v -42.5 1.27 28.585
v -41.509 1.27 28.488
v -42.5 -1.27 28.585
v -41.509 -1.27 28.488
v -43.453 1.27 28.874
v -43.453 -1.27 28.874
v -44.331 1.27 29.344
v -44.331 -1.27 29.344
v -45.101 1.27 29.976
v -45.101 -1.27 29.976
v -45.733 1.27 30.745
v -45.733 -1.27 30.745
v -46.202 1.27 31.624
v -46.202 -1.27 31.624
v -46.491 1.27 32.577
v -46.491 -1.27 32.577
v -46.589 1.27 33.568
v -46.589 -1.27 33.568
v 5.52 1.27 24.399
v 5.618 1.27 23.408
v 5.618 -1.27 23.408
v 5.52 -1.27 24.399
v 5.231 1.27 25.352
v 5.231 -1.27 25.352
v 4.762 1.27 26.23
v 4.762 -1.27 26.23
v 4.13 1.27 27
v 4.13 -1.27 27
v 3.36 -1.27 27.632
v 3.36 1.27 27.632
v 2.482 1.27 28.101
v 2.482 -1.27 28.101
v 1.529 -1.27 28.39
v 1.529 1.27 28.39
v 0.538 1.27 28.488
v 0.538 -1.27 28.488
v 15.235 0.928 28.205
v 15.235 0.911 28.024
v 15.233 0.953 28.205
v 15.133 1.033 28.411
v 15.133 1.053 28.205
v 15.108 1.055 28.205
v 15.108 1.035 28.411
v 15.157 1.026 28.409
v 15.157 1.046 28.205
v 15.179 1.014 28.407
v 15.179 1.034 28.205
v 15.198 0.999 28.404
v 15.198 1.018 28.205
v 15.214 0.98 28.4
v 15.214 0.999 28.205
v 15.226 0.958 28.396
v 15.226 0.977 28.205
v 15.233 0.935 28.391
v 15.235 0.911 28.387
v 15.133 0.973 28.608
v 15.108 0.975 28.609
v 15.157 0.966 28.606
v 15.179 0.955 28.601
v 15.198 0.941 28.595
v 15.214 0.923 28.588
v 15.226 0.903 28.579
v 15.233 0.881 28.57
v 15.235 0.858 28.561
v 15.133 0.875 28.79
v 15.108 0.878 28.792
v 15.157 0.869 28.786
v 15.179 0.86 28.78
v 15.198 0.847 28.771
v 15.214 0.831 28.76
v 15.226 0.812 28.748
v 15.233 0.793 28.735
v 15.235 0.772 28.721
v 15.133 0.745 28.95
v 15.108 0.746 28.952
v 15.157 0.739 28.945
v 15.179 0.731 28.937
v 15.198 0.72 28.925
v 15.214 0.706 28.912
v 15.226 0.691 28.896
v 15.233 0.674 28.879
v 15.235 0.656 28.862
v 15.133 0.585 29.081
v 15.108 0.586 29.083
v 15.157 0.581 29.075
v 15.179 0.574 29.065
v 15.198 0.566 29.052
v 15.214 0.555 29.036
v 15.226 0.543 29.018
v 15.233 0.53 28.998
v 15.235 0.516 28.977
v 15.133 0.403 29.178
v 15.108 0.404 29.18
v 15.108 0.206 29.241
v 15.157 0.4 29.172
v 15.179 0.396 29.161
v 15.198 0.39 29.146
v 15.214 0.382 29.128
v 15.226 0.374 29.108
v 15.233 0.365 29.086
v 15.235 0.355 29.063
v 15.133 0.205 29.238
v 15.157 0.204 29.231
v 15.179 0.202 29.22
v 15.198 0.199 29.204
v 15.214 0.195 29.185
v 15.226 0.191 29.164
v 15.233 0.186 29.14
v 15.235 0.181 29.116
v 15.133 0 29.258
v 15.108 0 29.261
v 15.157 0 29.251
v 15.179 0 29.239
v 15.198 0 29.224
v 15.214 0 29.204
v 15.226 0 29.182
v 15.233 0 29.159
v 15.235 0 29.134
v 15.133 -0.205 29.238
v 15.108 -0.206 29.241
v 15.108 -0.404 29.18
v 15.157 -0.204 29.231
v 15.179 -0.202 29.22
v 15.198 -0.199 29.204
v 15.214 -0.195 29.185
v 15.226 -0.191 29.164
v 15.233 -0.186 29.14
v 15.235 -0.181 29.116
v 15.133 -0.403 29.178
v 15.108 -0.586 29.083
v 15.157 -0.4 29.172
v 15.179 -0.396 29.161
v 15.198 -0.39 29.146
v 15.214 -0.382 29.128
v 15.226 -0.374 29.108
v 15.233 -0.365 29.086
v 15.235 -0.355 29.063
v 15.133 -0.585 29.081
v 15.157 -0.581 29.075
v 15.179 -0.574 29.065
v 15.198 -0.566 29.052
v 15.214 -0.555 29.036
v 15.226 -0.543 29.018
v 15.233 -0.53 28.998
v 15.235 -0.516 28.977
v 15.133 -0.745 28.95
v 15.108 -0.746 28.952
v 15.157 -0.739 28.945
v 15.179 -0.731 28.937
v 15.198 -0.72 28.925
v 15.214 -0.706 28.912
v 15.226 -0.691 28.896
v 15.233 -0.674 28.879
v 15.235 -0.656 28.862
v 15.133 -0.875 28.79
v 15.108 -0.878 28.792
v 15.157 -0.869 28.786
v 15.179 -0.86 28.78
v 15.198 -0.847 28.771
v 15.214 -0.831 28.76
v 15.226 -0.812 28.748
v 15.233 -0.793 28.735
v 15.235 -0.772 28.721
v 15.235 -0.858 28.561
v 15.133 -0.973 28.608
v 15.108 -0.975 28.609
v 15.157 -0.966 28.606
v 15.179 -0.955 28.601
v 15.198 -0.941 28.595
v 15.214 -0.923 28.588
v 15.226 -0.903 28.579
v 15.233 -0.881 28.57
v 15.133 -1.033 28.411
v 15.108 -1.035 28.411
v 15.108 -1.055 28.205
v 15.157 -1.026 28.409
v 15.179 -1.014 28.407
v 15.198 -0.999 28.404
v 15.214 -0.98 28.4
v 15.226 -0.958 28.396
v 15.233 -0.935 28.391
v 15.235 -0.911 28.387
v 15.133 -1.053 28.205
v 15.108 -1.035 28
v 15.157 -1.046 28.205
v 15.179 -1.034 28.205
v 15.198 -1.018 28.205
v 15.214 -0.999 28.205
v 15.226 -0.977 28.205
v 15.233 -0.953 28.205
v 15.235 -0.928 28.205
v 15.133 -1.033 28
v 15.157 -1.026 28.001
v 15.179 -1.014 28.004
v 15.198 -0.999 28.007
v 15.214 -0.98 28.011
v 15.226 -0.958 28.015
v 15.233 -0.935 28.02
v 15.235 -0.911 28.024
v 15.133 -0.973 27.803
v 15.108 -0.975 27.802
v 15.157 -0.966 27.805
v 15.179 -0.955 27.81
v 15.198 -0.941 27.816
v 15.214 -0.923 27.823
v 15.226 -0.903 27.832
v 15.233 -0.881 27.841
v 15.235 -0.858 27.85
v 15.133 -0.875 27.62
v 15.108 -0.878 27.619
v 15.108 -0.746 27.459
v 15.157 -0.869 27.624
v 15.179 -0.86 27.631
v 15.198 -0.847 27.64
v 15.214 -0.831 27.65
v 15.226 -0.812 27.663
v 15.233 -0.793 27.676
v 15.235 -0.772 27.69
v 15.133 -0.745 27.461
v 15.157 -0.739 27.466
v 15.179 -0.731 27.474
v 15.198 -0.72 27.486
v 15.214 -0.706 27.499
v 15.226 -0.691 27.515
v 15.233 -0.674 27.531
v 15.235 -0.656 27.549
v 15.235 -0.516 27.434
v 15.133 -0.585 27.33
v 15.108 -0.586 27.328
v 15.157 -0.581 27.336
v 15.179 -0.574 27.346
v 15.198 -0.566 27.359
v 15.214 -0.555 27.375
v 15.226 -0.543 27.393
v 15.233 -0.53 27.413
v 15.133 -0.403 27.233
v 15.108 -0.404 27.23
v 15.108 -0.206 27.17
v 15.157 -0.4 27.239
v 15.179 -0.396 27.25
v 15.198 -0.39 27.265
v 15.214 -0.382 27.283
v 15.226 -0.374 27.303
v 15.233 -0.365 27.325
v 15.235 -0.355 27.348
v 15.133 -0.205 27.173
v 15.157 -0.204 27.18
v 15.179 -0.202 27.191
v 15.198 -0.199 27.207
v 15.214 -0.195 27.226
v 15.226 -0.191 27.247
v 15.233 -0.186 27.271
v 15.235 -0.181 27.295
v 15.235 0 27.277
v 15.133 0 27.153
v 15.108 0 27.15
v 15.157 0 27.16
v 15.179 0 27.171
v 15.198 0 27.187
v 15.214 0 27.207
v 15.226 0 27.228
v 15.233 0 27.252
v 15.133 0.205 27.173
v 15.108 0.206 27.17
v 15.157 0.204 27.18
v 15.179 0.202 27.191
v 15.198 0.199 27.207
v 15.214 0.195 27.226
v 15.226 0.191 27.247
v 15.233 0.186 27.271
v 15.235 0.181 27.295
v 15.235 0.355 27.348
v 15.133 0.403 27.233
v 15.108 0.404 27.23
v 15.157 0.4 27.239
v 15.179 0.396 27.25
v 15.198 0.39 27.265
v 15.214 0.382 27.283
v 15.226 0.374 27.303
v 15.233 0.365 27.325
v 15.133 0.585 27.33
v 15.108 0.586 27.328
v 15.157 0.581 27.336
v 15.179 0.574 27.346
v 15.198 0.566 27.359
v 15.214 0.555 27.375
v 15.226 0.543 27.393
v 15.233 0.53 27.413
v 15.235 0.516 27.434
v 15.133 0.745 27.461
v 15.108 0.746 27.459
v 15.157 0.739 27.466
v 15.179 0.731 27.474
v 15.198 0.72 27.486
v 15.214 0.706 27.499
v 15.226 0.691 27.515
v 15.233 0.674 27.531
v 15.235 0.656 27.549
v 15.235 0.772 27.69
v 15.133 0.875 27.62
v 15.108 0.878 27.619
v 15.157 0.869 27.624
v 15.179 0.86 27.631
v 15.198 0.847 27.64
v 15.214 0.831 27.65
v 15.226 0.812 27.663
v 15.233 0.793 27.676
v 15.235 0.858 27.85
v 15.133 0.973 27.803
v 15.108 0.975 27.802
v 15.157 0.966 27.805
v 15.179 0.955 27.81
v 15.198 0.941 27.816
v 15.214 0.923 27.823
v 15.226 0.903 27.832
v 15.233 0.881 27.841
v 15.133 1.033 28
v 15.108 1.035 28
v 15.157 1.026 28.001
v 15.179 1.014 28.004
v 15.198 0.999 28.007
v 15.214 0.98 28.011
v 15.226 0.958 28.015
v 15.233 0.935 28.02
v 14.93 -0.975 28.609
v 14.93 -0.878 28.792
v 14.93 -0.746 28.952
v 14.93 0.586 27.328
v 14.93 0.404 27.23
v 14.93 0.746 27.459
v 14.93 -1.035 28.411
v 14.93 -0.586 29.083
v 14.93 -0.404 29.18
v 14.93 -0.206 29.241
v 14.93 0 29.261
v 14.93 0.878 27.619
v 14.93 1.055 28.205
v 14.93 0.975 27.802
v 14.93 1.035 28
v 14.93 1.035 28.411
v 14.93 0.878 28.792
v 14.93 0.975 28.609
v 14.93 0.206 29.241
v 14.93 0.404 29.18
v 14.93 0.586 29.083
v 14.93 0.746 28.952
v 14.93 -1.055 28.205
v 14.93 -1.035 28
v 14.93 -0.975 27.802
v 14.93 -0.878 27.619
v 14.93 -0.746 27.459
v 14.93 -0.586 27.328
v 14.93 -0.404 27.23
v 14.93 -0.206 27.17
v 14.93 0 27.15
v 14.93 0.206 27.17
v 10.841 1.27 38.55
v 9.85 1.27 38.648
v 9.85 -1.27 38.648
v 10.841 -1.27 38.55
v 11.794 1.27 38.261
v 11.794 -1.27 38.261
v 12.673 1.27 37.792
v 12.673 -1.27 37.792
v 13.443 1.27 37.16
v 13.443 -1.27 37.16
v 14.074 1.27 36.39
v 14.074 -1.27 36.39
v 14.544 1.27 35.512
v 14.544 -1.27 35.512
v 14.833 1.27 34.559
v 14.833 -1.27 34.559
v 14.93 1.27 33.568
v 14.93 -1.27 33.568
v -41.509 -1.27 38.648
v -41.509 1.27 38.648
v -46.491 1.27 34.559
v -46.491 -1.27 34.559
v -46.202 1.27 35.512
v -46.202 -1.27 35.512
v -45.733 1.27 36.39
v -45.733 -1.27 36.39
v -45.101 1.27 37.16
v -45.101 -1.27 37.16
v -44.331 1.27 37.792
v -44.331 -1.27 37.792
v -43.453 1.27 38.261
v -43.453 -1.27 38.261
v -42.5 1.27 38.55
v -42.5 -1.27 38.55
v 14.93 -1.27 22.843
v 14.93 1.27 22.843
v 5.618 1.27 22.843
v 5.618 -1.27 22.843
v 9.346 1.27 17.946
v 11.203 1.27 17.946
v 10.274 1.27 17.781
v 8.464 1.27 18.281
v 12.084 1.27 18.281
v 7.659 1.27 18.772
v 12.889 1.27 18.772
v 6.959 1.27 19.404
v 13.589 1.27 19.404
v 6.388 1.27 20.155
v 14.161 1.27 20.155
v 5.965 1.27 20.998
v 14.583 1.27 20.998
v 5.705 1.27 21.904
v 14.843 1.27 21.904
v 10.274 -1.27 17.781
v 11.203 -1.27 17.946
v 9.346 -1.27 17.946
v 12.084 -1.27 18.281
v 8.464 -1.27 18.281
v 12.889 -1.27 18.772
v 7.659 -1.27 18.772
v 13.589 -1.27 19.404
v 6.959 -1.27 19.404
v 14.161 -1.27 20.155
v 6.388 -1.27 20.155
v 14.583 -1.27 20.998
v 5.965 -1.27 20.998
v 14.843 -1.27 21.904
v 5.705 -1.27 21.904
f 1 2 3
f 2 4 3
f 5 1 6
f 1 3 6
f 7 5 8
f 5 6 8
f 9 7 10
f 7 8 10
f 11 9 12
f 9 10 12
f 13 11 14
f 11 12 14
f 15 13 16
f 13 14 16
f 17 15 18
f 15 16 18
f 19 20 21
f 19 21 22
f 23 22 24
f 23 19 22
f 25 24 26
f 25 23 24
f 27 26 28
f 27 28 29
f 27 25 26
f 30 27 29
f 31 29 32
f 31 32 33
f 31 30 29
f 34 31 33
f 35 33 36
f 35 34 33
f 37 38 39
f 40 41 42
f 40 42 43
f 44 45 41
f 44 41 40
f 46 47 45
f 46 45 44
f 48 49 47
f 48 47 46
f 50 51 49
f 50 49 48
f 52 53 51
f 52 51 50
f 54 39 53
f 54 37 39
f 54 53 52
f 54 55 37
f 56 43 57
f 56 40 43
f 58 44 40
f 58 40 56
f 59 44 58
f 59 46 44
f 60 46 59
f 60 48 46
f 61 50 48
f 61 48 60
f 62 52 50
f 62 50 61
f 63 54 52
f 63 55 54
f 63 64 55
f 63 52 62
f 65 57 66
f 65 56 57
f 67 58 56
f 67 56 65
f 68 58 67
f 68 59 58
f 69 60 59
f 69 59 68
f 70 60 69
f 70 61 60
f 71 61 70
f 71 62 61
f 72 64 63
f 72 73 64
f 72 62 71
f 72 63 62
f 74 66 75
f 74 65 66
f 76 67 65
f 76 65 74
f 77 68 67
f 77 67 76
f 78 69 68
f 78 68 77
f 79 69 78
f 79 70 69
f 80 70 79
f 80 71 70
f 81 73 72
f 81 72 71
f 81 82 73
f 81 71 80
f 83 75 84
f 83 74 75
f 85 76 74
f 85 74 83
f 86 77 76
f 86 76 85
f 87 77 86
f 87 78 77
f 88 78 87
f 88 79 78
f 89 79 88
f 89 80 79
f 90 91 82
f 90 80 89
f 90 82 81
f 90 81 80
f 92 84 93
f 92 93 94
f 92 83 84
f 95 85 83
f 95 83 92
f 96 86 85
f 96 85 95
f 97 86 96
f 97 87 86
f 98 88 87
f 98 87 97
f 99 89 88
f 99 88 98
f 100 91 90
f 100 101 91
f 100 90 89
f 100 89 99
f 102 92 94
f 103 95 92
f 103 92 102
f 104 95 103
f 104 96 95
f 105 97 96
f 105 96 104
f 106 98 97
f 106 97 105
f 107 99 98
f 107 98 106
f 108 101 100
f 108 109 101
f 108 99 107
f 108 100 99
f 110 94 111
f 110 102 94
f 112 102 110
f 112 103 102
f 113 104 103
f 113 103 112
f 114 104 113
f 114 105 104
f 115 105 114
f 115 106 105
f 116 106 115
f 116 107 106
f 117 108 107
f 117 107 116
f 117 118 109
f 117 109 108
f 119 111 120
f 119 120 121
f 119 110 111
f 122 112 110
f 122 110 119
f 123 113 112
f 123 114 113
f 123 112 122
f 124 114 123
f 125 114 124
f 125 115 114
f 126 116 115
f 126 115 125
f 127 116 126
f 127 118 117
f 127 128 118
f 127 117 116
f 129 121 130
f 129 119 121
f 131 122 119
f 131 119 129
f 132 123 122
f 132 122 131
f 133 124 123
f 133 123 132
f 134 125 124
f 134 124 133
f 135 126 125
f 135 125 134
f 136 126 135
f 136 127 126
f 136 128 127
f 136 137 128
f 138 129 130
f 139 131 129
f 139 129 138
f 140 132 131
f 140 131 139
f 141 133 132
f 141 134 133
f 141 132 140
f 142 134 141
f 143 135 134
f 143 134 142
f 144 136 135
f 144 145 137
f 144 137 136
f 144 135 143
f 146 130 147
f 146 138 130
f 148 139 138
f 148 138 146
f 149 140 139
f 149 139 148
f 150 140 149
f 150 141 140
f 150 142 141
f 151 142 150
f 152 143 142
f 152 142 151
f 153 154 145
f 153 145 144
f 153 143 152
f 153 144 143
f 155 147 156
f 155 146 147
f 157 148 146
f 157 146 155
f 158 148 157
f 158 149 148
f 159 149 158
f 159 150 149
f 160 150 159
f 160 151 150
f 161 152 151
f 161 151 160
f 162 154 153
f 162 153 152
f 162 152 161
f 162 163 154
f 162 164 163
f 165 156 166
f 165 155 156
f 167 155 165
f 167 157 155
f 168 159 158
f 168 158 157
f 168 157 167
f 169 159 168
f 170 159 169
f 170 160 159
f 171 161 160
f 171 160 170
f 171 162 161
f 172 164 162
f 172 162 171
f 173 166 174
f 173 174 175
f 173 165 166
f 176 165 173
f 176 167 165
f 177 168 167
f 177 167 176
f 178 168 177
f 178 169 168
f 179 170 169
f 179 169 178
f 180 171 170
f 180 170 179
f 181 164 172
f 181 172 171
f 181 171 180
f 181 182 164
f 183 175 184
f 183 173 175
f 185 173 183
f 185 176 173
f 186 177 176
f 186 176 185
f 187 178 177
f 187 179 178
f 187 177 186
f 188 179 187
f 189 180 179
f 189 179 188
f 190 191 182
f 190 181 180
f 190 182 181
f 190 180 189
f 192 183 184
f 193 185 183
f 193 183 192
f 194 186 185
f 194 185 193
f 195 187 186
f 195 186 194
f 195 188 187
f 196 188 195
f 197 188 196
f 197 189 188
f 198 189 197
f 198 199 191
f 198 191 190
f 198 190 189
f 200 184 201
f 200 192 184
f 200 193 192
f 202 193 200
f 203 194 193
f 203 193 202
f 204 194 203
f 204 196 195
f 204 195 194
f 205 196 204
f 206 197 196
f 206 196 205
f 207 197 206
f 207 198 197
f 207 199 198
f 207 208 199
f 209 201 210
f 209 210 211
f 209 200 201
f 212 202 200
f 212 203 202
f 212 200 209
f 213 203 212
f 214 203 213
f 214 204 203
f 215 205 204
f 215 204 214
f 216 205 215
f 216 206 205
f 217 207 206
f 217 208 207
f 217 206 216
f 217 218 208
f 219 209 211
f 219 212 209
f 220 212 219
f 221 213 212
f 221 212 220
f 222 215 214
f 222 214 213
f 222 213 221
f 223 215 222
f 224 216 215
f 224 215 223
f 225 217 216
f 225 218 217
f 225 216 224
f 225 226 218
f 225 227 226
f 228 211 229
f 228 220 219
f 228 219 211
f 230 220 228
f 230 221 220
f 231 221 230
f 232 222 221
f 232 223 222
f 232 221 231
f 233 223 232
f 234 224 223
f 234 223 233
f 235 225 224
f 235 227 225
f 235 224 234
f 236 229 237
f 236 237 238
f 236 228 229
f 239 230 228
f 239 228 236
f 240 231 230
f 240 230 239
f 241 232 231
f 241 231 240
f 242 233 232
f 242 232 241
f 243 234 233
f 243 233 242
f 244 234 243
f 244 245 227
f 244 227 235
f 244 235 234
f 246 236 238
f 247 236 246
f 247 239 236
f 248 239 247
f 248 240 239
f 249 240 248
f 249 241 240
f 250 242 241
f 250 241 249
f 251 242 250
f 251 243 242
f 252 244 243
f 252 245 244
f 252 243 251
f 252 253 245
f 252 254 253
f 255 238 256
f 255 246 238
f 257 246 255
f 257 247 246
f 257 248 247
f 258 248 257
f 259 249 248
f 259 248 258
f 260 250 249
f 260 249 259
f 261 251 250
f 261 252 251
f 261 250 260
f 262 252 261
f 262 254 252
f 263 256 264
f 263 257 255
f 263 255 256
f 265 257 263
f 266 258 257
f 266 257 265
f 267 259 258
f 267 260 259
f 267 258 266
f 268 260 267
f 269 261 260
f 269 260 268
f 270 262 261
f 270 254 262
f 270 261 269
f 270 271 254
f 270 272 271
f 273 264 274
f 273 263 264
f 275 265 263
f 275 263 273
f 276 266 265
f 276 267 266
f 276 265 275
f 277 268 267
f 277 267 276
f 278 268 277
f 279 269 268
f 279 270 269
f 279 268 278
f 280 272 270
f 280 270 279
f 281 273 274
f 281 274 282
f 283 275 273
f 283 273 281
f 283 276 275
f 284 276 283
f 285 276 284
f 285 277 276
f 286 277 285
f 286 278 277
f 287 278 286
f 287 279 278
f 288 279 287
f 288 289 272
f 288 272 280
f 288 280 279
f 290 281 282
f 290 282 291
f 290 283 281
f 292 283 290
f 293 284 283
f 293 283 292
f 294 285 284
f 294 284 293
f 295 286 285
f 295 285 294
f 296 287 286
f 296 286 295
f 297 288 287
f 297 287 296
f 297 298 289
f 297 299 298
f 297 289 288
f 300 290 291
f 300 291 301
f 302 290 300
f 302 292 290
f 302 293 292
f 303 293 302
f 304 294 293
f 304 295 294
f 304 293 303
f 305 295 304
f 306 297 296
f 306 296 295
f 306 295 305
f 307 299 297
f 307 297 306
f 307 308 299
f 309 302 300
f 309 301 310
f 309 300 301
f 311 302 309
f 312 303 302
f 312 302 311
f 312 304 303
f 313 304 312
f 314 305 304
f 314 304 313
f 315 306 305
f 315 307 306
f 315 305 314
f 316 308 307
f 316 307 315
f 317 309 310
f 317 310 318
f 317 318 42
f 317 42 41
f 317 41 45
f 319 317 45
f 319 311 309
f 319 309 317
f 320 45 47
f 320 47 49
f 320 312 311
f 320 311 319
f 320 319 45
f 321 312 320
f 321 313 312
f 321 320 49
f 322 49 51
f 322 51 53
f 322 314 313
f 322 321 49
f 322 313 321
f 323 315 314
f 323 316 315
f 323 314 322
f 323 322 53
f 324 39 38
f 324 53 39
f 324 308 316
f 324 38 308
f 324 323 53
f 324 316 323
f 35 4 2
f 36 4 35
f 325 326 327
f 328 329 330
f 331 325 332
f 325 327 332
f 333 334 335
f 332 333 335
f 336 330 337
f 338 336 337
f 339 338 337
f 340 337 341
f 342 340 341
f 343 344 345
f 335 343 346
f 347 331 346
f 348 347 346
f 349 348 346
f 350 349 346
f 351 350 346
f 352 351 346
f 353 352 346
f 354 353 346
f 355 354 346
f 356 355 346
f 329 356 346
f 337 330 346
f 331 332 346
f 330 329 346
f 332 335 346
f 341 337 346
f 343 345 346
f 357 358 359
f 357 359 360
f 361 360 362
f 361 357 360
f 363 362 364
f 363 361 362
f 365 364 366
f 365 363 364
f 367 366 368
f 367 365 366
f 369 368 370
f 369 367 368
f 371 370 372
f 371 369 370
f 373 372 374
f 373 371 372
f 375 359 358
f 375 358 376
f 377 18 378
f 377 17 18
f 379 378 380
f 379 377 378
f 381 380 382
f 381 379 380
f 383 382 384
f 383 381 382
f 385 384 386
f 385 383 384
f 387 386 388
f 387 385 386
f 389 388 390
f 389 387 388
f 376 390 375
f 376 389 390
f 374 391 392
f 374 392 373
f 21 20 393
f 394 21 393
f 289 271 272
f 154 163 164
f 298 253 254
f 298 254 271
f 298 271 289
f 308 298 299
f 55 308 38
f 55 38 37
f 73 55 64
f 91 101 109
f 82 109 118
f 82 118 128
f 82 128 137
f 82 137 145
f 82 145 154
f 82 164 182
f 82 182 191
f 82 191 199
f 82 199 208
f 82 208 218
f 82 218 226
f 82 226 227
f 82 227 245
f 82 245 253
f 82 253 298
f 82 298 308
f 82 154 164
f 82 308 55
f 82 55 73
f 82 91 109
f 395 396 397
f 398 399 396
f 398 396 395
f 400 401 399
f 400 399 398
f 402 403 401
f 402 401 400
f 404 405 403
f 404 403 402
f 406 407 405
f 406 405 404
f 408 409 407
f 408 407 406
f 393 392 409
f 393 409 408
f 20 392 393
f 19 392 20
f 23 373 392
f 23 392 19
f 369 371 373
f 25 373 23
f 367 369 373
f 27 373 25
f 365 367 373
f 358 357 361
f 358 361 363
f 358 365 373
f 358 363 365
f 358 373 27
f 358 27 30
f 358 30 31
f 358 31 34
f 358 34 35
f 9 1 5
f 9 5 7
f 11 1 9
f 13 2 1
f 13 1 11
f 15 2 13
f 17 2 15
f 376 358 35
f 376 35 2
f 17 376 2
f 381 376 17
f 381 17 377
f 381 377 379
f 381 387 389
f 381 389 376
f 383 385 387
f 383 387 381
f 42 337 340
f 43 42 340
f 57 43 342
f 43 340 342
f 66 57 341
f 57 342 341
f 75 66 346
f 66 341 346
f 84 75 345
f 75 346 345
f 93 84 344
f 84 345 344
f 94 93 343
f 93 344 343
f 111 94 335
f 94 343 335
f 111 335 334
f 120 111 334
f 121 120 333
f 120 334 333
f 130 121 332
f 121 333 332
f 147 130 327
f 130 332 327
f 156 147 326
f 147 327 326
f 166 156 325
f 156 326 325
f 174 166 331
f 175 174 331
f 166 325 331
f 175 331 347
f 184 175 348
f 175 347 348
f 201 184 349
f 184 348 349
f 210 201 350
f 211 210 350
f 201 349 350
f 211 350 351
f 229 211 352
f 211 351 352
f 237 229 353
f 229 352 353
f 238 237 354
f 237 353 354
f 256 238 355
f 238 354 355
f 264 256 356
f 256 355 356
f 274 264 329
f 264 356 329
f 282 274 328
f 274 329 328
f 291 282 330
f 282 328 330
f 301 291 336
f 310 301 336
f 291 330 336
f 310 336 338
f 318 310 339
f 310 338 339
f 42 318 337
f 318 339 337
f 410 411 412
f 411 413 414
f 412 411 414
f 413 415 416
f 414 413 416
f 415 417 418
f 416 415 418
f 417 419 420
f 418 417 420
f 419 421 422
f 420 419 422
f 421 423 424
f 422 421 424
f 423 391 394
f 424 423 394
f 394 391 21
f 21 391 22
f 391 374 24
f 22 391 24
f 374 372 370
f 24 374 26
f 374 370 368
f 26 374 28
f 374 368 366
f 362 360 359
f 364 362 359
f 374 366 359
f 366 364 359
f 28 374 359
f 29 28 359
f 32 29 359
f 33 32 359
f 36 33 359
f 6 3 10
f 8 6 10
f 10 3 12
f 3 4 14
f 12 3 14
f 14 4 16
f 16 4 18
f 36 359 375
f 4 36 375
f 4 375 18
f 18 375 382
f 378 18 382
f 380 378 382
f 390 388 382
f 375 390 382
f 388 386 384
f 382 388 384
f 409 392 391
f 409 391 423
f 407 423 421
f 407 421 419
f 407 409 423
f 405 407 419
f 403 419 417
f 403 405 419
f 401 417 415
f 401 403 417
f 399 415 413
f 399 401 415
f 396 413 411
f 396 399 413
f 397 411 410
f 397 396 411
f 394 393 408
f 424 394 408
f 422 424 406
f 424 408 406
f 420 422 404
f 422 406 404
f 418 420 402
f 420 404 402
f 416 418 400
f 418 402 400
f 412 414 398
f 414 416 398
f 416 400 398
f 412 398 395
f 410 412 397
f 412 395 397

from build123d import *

# Parameters (mm, degrees)
F1_DEPTH    = 1.27
F2_T1_DEPTH = 2.54
F2_T3_DEPTH = 27.94
F3_R        = 5.07999
F4_R        = 1.0553612336
F5_DEPTH    = 0.3048
F6_R        = 0.127


# Not quite as in the source:
# - a fillet or chamfer that OpenCascade refuses, or shapes differently, is made with other operations: its cross-section is extruded or revolved along the edge and cut away or added
# - a fillet or chamfer is up to 0.001 mm smaller than in the source, because OpenCascade refuses the exact size


with BuildPart() as f1:
    # F0 (on Front) → F1 (new body, symmetric)
    with BuildSketch(Plane.XZ):
        Polygon((-46.589029785, 38.6476762999), (-46.589029785, 28.4876762999), (5.6178237253, 28.4876762999), (5.6178237253, 17.7632305365), (14.9303989669, 17.7632305365), (14.9303989669, 38.6476762999), align=None)
    extrude(amount=F1_DEPTH, both=True)

    # F2: fillet of radius 5.08 on 4 edges, made by hand

    # F2_s2 → F2_t1 (join)
    with BuildSketch(Plane.XZ.offset(-1.27)):
        with BuildLine():
            ThreePointArc((5.6178237253, 23.4076762999), (4.1299261737, 26.9997787484), (0.5378237253, 28.4876762999))
            Line((0.5378237253, 28.4876762999), (5.6178237253, 28.4876762999))
            Line((5.6178237253, 28.4876762999), (5.6178237253, 23.4076762999))
        make_face()
    extrude(amount=F2_T1_DEPTH)

    # F2_s4 → F2_t3 (cut)
    with BuildSketch(Plane.XZ.offset(-13.97)):
        with BuildLine():
            ThreePointArc((9.8503989669, 38.6476762999), (13.4425014153, 37.1597787484), (14.9303989669, 33.5676762999))
            Line((14.9303989669, 33.5676762999), (14.9303989669, 38.6476762999))
            Line((14.9303989669, 38.6476762999), (9.8503989669, 38.6476762999))
        make_face()
        with BuildLine():
            ThreePointArc((14.9303989669, 22.8432305365), (13.4425014153, 19.251128088), (9.8503989669, 17.7632305365))
            Line((9.8503989669, 17.7632305365), (14.9303989669, 17.7632305365))
            Line((14.9303989669, 17.7632305365), (14.9303989669, 22.8432305365))
        make_face()
        with BuildLine():
            ThreePointArc((5.6178237253, 22.8432305365), (7.1057212768, 19.251128088), (10.6978237253, 17.7632305365))
            Line((10.6978237253, 17.7632305365), (5.6178237253, 17.7632305365))
            Line((5.6178237253, 17.7632305365), (5.6178237253, 22.8432305365))
        make_face()
    extrude(amount=F2_T3_DEPTH, mode=Mode.SUBTRACT)

    # F3 (radius 5.08 in the source; OpenCascade refuses exactly that, so slightly less here)
    f3_edges = [f1.edges().sort_by_distance(p)[0] for p in [
        (-46.58903, 0, 38.647676),
        (-46.58903, 0, 28.487676),
    ]]
    fillet(f3_edges, radius=F3_R)


with BuildPart() as f5:
    # F4 (on face) → F5 (new body)
    with BuildSketch(Plane.YZ.offset(14.9303989669)):
        with Locations((0, 28.2054534182)):
            Circle(F4_R)
    extrude(amount=F5_DEPTH)

    # F6
    f6_edges = [f5.edges().sort_by_distance(p)[0] for p in [
        (15.235199, -1.055361, 28.205453),
    ]]
    fillet(f6_edges, radius=F6_R)


solid = Compound([f1.part, f5.part])
